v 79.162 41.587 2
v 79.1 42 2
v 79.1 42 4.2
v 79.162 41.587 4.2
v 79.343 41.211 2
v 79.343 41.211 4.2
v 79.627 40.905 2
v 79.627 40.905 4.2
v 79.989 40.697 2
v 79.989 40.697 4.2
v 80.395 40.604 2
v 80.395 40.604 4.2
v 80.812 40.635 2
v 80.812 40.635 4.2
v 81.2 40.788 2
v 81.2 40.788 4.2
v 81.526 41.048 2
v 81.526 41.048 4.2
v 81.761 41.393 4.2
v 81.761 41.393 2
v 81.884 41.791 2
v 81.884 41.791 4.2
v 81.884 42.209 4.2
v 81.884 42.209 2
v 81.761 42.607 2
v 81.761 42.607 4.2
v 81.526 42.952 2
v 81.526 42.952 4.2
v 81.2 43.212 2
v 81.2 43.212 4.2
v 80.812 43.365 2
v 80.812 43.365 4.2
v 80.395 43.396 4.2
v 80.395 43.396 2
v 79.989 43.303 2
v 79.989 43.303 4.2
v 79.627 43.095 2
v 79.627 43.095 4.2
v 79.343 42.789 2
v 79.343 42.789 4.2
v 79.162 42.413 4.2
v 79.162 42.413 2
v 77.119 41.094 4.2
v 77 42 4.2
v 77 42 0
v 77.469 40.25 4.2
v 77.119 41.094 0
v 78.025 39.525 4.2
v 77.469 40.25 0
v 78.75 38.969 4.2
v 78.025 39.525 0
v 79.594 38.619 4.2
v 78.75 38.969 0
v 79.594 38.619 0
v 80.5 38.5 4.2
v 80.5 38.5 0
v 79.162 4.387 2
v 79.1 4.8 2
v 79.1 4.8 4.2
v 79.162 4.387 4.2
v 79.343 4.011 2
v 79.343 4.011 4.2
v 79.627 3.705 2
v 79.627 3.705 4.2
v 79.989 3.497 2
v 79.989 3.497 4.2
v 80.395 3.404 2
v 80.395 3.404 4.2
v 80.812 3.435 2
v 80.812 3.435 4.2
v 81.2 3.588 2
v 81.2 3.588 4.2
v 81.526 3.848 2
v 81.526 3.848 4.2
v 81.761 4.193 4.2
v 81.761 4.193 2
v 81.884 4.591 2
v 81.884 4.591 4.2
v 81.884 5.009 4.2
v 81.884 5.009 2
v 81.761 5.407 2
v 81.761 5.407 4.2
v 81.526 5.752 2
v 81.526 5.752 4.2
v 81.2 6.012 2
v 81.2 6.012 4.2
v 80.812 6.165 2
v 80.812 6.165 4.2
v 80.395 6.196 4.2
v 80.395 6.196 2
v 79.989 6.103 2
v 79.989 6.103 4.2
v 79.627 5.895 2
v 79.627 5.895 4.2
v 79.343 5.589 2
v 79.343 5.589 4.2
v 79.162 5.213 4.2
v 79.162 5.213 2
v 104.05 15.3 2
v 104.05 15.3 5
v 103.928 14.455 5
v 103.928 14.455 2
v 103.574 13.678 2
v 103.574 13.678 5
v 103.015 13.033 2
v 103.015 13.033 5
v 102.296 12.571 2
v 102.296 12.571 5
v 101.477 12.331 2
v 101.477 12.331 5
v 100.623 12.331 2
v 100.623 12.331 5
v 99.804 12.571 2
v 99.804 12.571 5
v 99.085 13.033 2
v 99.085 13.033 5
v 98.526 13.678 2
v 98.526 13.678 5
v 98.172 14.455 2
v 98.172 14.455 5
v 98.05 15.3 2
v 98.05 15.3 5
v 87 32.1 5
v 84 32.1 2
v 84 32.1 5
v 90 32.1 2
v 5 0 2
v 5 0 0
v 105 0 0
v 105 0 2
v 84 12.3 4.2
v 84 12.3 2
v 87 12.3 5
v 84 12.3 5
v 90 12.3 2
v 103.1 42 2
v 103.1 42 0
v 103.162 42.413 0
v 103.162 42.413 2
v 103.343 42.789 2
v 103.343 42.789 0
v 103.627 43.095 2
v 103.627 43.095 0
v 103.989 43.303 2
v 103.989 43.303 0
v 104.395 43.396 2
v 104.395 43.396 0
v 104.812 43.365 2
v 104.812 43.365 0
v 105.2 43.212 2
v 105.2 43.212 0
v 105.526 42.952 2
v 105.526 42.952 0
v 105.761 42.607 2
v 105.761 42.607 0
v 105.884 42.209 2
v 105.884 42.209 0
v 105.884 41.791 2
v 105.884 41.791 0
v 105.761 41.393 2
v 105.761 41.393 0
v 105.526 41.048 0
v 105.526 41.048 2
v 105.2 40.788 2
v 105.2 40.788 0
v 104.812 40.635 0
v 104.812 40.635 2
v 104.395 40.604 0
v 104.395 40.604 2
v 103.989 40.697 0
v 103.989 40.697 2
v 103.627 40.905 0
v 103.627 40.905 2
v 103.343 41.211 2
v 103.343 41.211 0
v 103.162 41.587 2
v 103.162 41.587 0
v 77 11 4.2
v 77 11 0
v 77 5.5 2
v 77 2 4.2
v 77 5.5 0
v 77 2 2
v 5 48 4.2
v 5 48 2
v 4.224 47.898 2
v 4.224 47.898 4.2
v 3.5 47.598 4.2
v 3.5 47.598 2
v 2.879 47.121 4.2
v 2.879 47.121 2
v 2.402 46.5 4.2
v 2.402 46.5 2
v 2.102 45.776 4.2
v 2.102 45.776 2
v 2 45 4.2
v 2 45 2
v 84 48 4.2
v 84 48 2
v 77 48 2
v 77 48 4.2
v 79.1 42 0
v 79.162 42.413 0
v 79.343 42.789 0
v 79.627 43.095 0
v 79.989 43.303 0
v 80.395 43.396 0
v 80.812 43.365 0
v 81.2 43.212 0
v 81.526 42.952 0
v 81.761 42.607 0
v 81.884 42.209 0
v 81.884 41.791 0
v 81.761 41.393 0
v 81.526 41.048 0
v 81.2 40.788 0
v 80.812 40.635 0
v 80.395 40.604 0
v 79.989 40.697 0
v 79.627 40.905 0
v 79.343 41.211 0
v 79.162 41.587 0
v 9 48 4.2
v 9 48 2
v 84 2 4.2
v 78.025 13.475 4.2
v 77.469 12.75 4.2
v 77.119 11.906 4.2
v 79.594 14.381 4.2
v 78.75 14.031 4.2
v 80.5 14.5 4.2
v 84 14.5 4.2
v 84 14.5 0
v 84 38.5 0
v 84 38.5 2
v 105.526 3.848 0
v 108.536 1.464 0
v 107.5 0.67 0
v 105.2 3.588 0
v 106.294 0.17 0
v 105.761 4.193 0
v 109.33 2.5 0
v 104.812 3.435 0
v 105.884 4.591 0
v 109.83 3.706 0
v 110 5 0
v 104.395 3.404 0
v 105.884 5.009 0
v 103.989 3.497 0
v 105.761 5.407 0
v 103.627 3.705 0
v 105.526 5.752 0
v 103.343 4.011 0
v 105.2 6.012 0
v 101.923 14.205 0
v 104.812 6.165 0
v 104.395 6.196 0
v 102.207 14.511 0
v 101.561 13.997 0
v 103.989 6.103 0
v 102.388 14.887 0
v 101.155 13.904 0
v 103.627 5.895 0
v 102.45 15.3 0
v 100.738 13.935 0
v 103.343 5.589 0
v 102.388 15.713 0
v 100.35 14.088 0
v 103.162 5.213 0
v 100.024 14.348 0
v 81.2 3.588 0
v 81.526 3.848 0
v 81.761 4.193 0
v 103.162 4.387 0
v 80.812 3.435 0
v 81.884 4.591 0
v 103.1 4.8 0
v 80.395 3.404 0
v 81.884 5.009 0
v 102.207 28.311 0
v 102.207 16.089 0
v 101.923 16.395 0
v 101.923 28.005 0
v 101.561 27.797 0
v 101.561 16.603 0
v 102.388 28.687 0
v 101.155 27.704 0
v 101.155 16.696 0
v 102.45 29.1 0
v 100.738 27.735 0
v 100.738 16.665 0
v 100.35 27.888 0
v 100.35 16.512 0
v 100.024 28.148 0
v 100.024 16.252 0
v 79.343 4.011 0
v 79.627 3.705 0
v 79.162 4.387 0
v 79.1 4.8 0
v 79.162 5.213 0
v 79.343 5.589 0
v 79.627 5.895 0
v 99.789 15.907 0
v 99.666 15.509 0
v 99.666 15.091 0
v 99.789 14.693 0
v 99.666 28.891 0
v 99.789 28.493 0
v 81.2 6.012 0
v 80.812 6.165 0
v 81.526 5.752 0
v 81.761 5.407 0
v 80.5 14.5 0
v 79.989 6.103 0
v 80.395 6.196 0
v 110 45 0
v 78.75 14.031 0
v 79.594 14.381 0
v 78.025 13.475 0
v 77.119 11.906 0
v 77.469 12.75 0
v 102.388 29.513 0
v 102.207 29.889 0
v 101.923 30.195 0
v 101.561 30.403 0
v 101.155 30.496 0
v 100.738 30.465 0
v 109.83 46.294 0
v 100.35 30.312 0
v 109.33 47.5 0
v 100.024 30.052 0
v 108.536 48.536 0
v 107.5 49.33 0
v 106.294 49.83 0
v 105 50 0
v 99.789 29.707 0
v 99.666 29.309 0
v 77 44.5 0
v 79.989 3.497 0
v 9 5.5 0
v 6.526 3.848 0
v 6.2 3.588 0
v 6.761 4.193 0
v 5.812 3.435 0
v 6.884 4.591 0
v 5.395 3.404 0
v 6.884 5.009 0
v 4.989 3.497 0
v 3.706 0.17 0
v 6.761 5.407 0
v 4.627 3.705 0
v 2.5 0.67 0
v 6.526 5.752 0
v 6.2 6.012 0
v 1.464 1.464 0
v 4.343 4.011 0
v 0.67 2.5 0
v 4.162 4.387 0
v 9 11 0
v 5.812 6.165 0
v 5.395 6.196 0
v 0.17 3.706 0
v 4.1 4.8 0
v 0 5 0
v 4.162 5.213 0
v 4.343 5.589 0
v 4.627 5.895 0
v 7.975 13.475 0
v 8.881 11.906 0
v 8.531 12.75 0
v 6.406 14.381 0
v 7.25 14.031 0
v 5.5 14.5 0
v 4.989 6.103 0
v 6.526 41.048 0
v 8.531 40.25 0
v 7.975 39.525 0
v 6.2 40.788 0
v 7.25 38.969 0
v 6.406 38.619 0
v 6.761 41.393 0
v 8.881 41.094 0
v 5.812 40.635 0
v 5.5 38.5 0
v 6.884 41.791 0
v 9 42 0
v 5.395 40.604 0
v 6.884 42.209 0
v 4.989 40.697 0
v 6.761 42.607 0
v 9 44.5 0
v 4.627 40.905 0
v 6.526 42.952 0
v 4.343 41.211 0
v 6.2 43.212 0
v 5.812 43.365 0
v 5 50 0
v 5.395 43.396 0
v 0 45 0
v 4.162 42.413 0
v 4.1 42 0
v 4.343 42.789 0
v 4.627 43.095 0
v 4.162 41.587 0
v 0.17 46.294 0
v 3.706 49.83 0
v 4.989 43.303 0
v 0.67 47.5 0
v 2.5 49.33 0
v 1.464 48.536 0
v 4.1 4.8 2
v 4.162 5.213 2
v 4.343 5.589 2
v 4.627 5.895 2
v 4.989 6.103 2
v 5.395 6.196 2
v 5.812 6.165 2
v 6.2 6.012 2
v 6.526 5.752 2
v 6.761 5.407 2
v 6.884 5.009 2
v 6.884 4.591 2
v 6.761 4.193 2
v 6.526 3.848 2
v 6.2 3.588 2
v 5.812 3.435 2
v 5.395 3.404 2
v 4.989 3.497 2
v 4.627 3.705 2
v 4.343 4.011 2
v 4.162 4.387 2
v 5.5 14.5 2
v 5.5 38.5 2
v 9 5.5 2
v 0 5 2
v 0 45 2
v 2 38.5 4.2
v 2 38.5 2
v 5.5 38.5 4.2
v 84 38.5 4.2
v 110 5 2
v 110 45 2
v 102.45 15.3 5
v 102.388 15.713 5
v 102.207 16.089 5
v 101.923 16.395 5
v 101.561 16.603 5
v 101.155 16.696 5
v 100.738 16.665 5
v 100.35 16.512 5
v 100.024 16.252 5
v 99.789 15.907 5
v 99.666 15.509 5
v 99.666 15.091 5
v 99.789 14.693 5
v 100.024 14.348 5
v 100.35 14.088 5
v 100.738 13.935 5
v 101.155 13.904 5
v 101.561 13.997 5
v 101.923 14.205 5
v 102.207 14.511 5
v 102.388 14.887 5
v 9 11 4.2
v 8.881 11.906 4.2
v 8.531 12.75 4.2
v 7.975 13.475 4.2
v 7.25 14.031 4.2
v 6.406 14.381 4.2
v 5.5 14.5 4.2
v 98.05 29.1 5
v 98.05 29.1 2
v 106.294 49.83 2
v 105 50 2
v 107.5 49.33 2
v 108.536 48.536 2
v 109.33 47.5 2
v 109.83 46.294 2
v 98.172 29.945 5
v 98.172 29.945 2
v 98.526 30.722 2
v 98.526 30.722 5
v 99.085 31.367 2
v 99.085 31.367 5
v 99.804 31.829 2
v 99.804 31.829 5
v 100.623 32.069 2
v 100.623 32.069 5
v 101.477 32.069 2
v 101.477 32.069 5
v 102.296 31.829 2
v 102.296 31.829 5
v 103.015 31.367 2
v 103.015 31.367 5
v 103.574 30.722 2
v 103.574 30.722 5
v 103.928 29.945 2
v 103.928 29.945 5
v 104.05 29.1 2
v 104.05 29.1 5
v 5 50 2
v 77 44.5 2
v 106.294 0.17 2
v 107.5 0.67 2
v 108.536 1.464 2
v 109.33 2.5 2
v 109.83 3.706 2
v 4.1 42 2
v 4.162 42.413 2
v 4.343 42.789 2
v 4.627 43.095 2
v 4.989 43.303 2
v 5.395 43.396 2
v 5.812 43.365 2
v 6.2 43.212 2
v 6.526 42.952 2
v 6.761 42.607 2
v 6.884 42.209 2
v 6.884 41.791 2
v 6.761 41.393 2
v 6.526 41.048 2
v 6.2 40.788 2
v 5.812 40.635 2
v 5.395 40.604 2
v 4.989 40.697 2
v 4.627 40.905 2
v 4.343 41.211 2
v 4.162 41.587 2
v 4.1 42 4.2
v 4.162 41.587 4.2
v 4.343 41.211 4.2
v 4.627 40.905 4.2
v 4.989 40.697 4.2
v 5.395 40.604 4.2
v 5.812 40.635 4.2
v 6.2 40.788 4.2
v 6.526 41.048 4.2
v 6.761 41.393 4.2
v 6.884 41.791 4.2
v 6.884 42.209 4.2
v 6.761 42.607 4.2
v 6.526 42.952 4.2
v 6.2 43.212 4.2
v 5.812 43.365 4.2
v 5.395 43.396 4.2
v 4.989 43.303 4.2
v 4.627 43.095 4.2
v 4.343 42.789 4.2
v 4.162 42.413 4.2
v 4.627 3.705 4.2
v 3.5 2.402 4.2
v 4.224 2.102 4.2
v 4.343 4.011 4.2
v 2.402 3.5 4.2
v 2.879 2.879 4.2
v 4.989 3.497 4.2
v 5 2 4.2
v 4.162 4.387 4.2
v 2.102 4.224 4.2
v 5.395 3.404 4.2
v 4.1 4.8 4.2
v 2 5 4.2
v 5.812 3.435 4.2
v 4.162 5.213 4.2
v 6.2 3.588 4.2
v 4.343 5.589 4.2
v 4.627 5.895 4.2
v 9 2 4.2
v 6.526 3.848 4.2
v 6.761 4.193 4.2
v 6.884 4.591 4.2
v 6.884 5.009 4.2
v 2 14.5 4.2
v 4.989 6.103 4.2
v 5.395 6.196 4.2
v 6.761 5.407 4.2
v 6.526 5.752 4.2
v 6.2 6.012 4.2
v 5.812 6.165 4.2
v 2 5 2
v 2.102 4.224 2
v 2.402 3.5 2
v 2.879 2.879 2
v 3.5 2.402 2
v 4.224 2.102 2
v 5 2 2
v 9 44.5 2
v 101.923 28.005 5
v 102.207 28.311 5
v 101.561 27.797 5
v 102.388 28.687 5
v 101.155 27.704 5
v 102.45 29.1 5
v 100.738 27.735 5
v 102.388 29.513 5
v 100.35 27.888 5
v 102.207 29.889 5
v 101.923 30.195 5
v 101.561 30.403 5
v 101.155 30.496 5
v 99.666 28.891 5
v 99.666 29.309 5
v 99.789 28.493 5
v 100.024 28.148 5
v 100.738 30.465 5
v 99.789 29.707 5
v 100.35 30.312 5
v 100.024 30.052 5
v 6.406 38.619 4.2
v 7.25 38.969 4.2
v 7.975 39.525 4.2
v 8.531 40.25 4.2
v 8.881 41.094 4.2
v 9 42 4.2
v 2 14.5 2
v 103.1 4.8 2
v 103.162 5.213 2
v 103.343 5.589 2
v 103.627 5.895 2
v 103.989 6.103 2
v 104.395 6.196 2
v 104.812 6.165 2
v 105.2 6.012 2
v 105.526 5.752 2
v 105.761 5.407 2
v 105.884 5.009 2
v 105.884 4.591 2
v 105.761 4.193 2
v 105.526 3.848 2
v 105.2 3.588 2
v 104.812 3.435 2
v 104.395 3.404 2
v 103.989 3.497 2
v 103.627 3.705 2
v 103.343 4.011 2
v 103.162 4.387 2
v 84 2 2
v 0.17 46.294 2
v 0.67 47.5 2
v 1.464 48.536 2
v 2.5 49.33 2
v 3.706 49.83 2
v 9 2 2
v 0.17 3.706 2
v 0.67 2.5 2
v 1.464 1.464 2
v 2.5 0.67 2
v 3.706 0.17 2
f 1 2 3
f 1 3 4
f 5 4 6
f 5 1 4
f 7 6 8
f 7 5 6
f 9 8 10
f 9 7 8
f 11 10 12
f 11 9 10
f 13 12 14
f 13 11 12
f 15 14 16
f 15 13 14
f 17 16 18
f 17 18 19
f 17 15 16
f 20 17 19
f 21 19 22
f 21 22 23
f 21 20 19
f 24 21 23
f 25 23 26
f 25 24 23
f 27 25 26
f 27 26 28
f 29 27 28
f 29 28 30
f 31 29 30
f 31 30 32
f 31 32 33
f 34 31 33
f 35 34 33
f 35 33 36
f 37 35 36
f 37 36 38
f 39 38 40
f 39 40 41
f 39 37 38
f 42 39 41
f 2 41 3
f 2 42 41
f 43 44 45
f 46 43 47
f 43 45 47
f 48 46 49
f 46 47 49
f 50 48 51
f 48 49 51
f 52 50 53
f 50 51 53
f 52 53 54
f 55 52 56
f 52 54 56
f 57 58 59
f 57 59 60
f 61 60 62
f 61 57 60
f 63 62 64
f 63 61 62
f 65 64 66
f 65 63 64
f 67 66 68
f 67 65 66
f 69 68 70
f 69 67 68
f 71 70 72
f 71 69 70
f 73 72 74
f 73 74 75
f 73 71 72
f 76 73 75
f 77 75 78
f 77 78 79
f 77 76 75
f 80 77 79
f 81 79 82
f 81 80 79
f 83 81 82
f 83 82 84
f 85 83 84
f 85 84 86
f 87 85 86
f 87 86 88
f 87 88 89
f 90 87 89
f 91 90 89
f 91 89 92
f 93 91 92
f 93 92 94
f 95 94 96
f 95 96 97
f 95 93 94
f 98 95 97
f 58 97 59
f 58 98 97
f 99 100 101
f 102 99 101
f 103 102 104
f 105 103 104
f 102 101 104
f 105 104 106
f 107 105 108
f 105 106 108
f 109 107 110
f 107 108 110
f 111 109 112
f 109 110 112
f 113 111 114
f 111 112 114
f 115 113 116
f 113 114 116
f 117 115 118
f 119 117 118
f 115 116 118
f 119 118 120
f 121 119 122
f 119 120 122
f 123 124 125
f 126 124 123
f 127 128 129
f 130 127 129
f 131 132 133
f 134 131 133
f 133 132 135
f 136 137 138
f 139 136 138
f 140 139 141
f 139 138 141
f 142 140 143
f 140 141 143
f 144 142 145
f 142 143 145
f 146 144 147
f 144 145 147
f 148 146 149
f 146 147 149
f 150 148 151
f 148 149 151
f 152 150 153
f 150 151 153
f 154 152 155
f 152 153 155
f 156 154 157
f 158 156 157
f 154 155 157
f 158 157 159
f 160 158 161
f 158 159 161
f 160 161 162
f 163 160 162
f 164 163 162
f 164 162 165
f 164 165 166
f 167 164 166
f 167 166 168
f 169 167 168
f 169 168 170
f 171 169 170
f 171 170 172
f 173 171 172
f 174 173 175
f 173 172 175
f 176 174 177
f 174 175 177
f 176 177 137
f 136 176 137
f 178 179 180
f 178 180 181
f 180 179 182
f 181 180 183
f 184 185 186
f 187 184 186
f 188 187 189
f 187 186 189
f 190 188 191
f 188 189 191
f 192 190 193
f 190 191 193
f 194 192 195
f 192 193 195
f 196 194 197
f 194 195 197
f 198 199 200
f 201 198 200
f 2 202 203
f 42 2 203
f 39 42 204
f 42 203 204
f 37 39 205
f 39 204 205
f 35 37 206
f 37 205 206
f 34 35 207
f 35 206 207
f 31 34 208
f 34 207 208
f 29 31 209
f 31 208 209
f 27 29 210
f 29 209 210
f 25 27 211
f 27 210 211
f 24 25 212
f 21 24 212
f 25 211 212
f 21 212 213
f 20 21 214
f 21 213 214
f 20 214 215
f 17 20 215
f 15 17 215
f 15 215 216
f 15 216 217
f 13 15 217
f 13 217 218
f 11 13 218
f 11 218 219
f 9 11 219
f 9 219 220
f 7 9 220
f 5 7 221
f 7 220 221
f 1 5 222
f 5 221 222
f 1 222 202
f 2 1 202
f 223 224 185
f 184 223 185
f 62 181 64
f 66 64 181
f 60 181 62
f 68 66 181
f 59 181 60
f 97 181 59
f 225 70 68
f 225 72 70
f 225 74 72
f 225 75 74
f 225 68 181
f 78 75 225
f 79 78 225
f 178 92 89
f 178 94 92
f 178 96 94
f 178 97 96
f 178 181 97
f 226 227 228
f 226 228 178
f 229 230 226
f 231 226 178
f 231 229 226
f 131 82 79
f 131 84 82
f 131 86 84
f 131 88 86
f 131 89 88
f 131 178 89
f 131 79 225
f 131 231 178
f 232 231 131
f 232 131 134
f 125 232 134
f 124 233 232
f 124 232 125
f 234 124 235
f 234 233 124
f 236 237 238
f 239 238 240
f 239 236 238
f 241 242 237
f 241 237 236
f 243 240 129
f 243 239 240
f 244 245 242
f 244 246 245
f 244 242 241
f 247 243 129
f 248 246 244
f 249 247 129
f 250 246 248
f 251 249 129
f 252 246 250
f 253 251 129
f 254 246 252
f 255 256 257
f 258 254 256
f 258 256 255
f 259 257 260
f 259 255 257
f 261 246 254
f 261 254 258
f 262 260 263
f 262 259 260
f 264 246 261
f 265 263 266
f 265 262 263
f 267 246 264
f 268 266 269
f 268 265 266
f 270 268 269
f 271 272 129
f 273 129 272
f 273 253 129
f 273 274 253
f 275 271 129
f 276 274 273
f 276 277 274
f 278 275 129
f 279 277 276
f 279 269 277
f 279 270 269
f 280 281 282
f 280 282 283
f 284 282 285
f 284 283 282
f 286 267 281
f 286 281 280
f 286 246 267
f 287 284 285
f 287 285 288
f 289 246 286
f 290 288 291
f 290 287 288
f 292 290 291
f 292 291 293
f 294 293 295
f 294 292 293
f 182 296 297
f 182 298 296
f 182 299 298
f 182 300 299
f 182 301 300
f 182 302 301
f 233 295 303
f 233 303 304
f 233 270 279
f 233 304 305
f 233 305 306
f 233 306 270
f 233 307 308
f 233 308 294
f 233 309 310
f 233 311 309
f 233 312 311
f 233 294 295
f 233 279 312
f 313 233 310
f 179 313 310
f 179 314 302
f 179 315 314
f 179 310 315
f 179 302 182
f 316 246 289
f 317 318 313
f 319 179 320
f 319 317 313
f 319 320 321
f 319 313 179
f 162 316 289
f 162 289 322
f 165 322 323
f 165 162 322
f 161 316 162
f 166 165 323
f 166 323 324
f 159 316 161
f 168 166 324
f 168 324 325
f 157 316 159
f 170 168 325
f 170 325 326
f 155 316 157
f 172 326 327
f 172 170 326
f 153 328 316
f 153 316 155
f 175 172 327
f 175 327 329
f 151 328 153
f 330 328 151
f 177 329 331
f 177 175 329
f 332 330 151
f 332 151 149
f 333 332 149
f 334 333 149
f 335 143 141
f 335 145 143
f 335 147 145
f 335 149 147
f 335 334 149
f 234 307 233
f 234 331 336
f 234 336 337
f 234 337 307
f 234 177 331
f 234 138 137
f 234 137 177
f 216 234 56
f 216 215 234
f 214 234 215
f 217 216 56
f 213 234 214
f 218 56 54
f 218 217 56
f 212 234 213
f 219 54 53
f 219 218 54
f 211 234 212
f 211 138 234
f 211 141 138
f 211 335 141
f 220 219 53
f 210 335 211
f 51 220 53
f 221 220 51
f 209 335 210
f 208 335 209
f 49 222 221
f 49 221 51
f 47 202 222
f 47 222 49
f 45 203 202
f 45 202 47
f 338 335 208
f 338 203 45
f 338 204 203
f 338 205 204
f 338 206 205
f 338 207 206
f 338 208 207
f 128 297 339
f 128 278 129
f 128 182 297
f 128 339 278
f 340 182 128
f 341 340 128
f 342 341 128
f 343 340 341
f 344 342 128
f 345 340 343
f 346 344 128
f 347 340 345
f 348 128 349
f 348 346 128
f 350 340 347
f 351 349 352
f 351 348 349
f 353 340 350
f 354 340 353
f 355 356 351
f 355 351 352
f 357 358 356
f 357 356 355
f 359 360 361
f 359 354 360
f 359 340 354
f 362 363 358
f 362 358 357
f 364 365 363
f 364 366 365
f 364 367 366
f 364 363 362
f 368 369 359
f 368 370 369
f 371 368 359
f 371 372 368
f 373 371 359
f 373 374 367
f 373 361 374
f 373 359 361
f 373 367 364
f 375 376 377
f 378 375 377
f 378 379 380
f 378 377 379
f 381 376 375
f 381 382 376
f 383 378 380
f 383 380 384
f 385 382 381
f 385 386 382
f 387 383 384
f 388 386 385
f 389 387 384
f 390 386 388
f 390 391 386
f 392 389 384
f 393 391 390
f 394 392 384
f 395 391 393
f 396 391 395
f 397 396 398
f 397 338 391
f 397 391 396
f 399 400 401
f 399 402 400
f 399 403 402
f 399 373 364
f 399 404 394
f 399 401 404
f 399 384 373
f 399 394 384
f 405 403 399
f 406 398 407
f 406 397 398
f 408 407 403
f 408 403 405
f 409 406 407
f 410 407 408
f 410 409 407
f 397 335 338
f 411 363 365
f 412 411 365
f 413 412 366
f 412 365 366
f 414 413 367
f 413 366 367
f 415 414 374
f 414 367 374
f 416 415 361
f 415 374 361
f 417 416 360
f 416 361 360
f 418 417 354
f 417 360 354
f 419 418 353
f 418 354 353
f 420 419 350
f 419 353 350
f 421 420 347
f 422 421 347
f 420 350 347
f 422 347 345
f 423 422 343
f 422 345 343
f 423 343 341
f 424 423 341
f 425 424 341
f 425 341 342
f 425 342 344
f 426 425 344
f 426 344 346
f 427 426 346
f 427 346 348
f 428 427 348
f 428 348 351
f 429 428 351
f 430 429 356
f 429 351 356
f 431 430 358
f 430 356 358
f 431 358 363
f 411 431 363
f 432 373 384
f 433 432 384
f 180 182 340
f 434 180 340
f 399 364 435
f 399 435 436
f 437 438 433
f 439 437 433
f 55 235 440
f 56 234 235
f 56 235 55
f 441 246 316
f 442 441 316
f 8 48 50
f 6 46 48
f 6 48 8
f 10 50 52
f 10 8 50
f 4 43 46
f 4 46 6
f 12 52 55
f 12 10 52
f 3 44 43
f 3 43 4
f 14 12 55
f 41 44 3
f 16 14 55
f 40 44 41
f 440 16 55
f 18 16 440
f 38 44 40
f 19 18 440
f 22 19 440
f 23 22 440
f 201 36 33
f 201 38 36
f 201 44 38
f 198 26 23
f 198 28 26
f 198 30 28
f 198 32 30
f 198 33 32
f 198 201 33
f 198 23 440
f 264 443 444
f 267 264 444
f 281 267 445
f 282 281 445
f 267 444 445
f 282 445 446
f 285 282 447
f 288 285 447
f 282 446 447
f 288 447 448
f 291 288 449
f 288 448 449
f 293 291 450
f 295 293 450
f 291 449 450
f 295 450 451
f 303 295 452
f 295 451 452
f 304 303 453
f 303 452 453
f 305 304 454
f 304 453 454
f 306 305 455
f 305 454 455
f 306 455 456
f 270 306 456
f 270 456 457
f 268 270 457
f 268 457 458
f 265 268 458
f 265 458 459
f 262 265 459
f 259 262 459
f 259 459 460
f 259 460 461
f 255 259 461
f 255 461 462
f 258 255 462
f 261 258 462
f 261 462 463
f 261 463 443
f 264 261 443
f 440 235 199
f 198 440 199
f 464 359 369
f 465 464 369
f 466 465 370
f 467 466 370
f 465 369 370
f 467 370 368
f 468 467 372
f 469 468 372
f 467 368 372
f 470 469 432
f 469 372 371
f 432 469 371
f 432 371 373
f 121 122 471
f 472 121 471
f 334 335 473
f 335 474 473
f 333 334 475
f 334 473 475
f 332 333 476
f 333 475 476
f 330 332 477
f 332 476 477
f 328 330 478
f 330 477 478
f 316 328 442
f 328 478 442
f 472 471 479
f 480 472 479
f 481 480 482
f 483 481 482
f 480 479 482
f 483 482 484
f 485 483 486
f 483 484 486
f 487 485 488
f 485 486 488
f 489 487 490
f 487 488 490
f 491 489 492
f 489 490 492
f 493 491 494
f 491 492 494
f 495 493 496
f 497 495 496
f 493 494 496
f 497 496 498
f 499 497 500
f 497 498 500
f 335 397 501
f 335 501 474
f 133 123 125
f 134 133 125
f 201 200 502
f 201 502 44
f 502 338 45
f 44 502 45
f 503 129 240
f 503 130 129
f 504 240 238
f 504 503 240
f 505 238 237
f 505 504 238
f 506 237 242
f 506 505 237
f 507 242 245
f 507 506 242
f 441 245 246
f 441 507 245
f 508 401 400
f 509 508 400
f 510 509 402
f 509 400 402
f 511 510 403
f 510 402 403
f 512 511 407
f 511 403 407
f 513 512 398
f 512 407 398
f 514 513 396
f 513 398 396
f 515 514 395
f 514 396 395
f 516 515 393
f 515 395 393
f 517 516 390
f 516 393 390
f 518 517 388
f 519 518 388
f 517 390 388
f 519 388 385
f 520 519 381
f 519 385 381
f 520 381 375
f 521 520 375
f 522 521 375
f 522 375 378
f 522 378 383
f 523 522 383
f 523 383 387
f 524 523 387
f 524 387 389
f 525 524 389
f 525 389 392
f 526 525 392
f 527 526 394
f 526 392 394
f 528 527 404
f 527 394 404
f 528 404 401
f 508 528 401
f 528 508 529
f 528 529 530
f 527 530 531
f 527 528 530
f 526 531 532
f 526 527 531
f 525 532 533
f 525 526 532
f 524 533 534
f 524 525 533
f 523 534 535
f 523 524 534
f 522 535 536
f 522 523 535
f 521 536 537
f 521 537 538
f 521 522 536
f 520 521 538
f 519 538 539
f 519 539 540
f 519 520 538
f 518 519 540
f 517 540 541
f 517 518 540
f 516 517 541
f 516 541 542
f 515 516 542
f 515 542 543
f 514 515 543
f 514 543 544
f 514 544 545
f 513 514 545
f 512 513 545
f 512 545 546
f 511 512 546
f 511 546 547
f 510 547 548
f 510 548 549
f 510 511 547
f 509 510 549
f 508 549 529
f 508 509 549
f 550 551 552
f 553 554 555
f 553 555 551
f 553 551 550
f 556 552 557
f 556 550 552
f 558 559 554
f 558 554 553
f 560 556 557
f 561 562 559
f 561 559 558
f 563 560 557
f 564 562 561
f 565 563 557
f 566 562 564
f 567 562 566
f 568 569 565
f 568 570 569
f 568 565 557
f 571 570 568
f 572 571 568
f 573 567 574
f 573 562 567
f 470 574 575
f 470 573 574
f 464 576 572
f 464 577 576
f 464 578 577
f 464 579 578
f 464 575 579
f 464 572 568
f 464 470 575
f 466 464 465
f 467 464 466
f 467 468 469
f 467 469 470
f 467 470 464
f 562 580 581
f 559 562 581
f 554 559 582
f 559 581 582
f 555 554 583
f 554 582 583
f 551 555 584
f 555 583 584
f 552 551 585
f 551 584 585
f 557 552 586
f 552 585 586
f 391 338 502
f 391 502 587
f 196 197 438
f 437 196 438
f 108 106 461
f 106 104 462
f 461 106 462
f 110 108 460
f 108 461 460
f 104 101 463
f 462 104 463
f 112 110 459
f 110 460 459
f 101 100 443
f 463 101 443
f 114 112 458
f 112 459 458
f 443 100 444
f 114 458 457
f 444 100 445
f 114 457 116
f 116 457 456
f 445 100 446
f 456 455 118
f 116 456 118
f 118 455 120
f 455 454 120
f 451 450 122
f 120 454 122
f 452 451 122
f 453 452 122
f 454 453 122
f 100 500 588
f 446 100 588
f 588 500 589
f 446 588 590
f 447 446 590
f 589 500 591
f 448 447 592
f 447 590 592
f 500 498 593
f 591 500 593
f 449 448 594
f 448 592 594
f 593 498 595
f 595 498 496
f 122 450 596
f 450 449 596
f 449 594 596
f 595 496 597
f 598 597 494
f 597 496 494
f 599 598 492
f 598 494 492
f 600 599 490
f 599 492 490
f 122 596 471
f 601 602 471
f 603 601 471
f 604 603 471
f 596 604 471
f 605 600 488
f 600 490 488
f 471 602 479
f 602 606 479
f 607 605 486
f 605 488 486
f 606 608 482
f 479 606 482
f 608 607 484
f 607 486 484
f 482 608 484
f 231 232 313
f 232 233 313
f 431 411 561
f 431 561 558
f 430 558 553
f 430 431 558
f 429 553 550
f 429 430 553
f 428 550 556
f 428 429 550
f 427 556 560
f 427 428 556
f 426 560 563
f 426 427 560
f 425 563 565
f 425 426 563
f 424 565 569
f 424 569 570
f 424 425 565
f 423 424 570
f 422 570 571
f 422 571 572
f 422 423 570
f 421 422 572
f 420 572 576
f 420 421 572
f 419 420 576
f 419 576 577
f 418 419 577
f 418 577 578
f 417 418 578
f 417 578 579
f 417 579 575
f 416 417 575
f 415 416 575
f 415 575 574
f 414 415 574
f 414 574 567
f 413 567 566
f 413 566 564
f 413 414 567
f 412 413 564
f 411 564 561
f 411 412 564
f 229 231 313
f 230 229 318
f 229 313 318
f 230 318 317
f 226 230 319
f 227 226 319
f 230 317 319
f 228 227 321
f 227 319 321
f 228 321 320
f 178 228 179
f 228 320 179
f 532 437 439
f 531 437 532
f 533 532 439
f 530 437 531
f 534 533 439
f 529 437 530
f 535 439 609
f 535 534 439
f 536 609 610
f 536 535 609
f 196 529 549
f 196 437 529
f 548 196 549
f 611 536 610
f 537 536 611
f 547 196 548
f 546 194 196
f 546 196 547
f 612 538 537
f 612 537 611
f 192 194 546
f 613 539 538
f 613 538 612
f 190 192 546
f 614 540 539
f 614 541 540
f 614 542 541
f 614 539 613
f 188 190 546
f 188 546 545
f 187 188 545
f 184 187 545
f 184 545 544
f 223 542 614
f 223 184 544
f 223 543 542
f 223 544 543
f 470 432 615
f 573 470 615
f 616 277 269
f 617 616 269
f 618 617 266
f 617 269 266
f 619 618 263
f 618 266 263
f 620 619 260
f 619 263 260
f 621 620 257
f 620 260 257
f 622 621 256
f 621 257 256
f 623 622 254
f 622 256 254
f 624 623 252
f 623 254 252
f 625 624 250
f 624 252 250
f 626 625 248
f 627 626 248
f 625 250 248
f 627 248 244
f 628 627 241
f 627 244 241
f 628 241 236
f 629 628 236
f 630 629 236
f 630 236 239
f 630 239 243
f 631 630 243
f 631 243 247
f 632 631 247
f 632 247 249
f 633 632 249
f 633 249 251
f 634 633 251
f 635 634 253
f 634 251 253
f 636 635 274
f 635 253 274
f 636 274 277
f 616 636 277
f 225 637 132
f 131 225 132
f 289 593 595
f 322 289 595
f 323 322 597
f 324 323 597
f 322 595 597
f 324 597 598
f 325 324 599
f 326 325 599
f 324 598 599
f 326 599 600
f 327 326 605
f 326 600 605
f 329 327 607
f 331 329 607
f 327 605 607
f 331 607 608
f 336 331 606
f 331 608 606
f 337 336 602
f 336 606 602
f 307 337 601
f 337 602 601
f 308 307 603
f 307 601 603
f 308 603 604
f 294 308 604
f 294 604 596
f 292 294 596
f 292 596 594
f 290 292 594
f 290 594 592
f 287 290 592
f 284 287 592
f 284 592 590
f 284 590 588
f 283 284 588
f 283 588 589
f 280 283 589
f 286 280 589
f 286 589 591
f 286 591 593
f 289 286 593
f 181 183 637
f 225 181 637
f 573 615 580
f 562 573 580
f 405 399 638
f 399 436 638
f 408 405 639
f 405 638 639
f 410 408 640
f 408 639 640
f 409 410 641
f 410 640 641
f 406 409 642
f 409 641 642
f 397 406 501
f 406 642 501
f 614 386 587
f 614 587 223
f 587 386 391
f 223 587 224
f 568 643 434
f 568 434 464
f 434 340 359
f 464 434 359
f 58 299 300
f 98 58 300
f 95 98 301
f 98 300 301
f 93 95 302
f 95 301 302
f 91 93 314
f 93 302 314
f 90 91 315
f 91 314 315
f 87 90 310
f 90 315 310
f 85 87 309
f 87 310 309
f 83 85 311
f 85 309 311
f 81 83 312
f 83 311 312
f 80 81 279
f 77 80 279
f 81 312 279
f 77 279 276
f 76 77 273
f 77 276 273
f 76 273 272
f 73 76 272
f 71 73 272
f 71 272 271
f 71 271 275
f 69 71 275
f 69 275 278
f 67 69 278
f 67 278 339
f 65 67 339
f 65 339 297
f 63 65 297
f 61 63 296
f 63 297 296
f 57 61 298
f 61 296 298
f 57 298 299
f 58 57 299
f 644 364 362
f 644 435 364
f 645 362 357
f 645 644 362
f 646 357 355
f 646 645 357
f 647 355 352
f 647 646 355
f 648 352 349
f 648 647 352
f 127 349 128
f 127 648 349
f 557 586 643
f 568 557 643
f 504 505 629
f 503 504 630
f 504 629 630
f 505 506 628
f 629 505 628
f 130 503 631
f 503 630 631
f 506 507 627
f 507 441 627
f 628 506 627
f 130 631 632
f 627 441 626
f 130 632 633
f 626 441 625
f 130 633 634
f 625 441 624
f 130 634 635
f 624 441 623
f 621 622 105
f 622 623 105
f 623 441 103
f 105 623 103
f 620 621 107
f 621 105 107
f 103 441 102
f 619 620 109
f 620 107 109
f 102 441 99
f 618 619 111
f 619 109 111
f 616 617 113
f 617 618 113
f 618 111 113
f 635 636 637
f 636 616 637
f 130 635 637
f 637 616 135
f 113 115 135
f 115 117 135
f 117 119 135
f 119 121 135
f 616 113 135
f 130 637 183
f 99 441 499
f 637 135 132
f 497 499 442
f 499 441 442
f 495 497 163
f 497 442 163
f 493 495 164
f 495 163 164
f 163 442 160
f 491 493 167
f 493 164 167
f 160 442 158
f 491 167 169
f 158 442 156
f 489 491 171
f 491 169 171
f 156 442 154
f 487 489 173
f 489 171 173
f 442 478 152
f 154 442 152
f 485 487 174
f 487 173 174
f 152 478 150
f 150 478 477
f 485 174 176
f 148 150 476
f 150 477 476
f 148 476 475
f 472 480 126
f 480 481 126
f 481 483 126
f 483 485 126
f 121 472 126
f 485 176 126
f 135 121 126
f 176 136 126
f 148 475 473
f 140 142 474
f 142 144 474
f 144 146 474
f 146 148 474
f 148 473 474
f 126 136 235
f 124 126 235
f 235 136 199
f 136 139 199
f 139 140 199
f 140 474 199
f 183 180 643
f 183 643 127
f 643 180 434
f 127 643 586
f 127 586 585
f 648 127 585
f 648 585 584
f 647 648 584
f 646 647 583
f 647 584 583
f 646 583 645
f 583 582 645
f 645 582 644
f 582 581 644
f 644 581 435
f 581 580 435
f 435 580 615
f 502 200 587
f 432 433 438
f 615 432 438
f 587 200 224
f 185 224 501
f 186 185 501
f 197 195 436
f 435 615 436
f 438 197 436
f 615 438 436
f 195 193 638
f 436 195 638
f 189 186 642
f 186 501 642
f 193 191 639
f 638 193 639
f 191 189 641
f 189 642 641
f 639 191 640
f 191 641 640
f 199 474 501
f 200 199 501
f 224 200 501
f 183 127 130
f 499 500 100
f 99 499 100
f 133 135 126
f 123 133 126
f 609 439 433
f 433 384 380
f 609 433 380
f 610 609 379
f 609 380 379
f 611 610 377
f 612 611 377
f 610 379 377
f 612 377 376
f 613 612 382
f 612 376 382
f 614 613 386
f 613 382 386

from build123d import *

# Parameters (mm, degrees)
SKICA1_W                 = 110
SKICA1_H                 = 50
SKICA1_W_2               = 82
SKICA1_H_2               = 46
P_IDAT_VYSUNUT_M1_DEPTH  = 2
SKICA2_R                 = 1.4
P_IDAT_VYSUNUT_M2_DEPTH  = 2
ZAOBLIT1_R               = 5
SKICA3_R                 = 1.4
ODEBRAT_VYSUNUT_M1_DEPTH = 2
P_IDAT_START             = 3
SKICA4_R                 = 1.4
P_IDAT_VYSUNUT_M3_DEPTH  = 3
SKICA5_R                 = 1.4
P_IDAT_VYSUNUT_M5_DEPTH  = 2.2
SKICA6_R                 = 1.4
ODEBRAT_VYSUNUT_M2_DEPTH = 2
P_IDAT_VYSUNUT_M6_REACH  = 122.868
SKICA8_W                 = 3
SKICA8_H                 = 19.8
ZKOSEN_1_SIZE            = 3
SKICA9_W                 = 68
SKICA9_H                 = 3.5
SKICA9_W_2               = 3.5
SKICA9_H_2               = 24
P_IDAT_VYSUNUT_M7_DEPTH  = 2


with BuildPart() as part:
    # Skica1 → Přidat vysunutím1 (new body)
    with BuildSketch(Plane.XY):
        with Locations((55, 25)):
            Rectangle(SKICA1_W, SKICA1_H)
        with Locations((43, 25)):
            Rectangle(SKICA1_W_2, SKICA1_H_2, mode=Mode.SUBTRACT)
    extrude(amount=P_IDAT_VYSUNUT_M1_DEPTH)

    # Skica2 → Přidat vysunutím2 (add)
    # profile 1 of 4: a face of its own
    with BuildSketch(Plane(origin=(0, 0, 0), x_dir=(-1, 0, 0), z_dir=(0, 0, -1))):
        with BuildLine():
            Line((-77, 42), (-77, 48))
            Line((-77, 48), (-84, 48))
            Line((-84, 48), (-84, 38.5))
            Line((-84, 38.5), (-80.5, 38.5))
            ThreePointArc((-80.5, 38.5), (-78.025126266, 39.525126266), (-77, 42))
        make_face()
        with Locations((-80.5, 42)):
            Circle(SKICA2_R, mode=Mode.SUBTRACT)
    # profile 2 of 4: a face of its own
    with BuildSketch(Plane(origin=(0, 0, 0), x_dir=(-1, 0, 0), z_dir=(0, 0, -1))):
        with BuildLine():
            Line((-9, 42), (-9, 48))
            Line((-9, 48), (-2, 48))
            Line((-2, 48), (-2, 38.5))
            Line((-2, 38.5), (-5.5, 38.5))
            ThreePointArc((-5.5, 38.5), (-7.974873734, 39.525126266), (-9, 42))
        make_face()
        with Locations((-5.5, 42)):
            Circle(SKICA2_R, mode=Mode.SUBTRACT)
    # profile 3 of 4: a face of its own
    with BuildSketch(Plane(origin=(0, 0, 0), x_dir=(-1, 0, 0), z_dir=(0, 0, -1))):
        with BuildLine():
            Line((-80.5, 14.5), (-84, 14.5))
            Line((-84, 14.5), (-84, 2))
            Line((-84, 2), (-77, 2))
            Line((-77, 2), (-77, 11))
            ThreePointArc((-77, 11), (-78.025126266, 13.474873734), (-80.5, 14.5))
        make_face()
        with Locations((-80.5, 4.8)):
            Circle(SKICA2_R, mode=Mode.SUBTRACT)
    # profile 4 of 4: a face of its own
    with BuildSketch(Plane(origin=(0, 0, 0), x_dir=(-1, 0, 0), z_dir=(0, 0, -1))):
        with BuildLine():
            Line((-5.5, 14.5), (-2, 14.5))
            Line((-2, 14.5), (-2, 2))
            Line((-2, 2), (-9, 2))
            Line((-9, 2), (-9, 11))
            ThreePointArc((-9, 11), (-7.974873734, 13.474873734), (-5.5, 14.5))
        make_face()
        with Locations((-5.5, 4.8)):
            Circle(SKICA2_R, mode=Mode.SUBTRACT)
    extrude(amount=-P_IDAT_VYSUNUT_M2_DEPTH)

    # Zaoblit1
    zaoblit1_edges = [part.edges().sort_by_distance(p)[0] for p in [
        (0, 50, 1),
        (110, 50, 1),
        (110, 0, 1),
        (0, 0, 1),
    ]]
    fillet(zaoblit1_edges, radius=ZAOBLIT1_R)

    # Skica3 → Odebrat vysunutím1 (cut)
    with BuildSketch(Plane.XY.offset(2)):
        with Locations((101.05, 29.1)):
            Circle(SKICA3_R)
        with Locations((101.05, 15.3)):
            Circle(SKICA3_R)
    extrude(amount=-ODEBRAT_VYSUNUT_M1_DEPTH, mode=Mode.SUBTRACT)

    # Skica4 → Přidat vysunutím3 (add)
    with BuildSketch(Plane.XY.offset(2).offset(P_IDAT_START)):
        with BuildLine():
            Line((104.05, 29.1), (104.05, 15.3))
            ThreePointArc((104.05, 15.3), (101.05, 12.3), (98.05, 15.3))
            Line((98.05, 15.3), (98.05, 29.1))
            ThreePointArc((98.05, 29.1), (101.05, 32.1), (104.05, 29.1))
        make_face()
        with Locations((101.05, 15.3)):
            Circle(SKICA4_R, mode=Mode.SUBTRACT)
        with Locations((101.05, 29.1)):
            Circle(SKICA4_R, mode=Mode.SUBTRACT)
    extrude(amount=-P_IDAT_VYSUNUT_M3_DEPTH)

    # Skica5 → Přidat vysunutím5 (add)
    # profile 1 of 4: a face of its own
    with BuildSketch(Plane.XY.offset(2)):
        with BuildLine():
            Line((2, 45), (2, 38.5))
            Line((2, 38.5), (5.5, 38.5))
            ThreePointArc((5.5, 38.5), (7.974873734, 39.525126266), (9, 42))
            Line((9, 42), (9, 48))
            Line((9, 48), (5, 48))
            ThreePointArc((5, 48), (2.878679656, 47.121320344), (2, 45))
        make_face()
        with Locations(Location((5.5, 42, 0), (0, 0, 180))):
            Circle(SKICA5_R, mode=Mode.SUBTRACT)
    # profile 2 of 4: a face of its own
    with BuildSketch(Plane.XY.offset(2)):
        with BuildLine():
            Line((5.5, 14.5), (2, 14.5))
            Line((2, 14.5), (2, 5))
            ThreePointArc((2, 5), (2.878679656, 2.878679656), (5, 2))
            Line((5, 2), (9, 2))
            Line((9, 2), (9, 11))
            ThreePointArc((9, 11), (7.974873734, 13.474873734), (5.5, 14.5))
        make_face()
        with Locations(Location((5.5, 4.8, 0), (0, 0, 180))):
            Circle(SKICA5_R, mode=Mode.SUBTRACT)
    # profile 3 of 4: a face of its own
    with BuildSketch(Plane.XY.offset(2)):
        with BuildLine():
            Line((84, 48), (77, 48))
            Line((77, 48), (77, 42))
            ThreePointArc((77, 42), (78.025126266, 39.525126266), (80.5, 38.5))
            Line((80.5, 38.5), (84, 38.5))
            Line((84, 38.5), (84, 48))
        make_face()
        with Locations(Location((80.5, 42, 0), (0, 0, 180))):
            Circle(SKICA5_R, mode=Mode.SUBTRACT)
    # profile 4 of 4: a face of its own
    with BuildSketch(Plane.XY.offset(2)):
        with BuildLine():
            Line((77, 11), (77, 2))
            Line((77, 2), (84, 2))
            Line((84, 2), (84, 14.5))
            Line((84, 14.5), (80.5, 14.5))
            ThreePointArc((80.5, 14.5), (78.025126266, 13.474873734), (77, 11))
        make_face()
        with Locations(Location((80.5, 4.8, 0), (0, 0, 180))):
            Circle(SKICA5_R, mode=Mode.SUBTRACT)
    extrude(amount=P_IDAT_VYSUNUT_M5_DEPTH)

    # Skica6 → Odebrat vysunutím2 (cut)
    with BuildSketch(Plane(origin=(0, 0, 0), x_dir=(-1, 0, 0), z_dir=(0, 0, -1))):
        with Locations((-104.5, 42)):
            Circle(SKICA6_R)
        with Locations((-104.5, 4.8)):
            Circle(SKICA6_R)
    extrude(amount=-ODEBRAT_VYSUNUT_M2_DEPTH, mode=Mode.SUBTRACT)

    # Přidat vysunutím6: up to this face of the body (flat: up to its plane)
    p_idat_vysunut_m6_end = Plane(part.part.faces().sort_by_distance((101.05, 22.2, 5))[0])
    # Skica8 → Přidat vysunutím6 (add, up to the picked face)
    with BuildSketch(Plane.XY.offset(2), mode=Mode.PRIVATE) as p_idat_vysunut_m6_sk1:
        with Locations((85.5, 22.2)):
            Rectangle(SKICA8_W, SKICA8_H)
    p_idat_vysunut_m6_tool1 = split(extrude(p_idat_vysunut_m6_sk1.sketch, amount=P_IDAT_VYSUNUT_M6_REACH, mode=Mode.PRIVATE), bisect_by=p_idat_vysunut_m6_end, keep=Keep.BOTH, mode=Mode.PRIVATE)
    add(p_idat_vysunut_m6_tool1.solids().sort_by(Axis((85.5, 22.2, 2), (0, 0, 1)))[0])

    # Zkosení1
    zkosen_1_edges = [part.edges().sort_by_distance(p)[0] for p in [
        (87, 22.2, 2),
    ]]
    chamfer(zkosen_1_edges, length=ZKOSEN_1_SIZE - 0.0001)  # a hair under: the kernel refuses the full size

    # Skica9 → Přidat vysunutím7 (add)
    with BuildSketch(Plane(origin=(0, 0, 0), x_dir=(-1, 0, 0), z_dir=(0, 0, -1))):
        with Locations((-43, 3.75)):
            Rectangle(SKICA9_W, SKICA9_H)
        with Locations((-43, 46.25)):
            Rectangle(SKICA9_W, SKICA9_H)
        with Locations((-3.75, 26.5)):
            Rectangle(SKICA9_W_2, SKICA9_H_2)
    extrude(amount=-P_IDAT_VYSUNUT_M7_DEPTH)


solid = part.part
